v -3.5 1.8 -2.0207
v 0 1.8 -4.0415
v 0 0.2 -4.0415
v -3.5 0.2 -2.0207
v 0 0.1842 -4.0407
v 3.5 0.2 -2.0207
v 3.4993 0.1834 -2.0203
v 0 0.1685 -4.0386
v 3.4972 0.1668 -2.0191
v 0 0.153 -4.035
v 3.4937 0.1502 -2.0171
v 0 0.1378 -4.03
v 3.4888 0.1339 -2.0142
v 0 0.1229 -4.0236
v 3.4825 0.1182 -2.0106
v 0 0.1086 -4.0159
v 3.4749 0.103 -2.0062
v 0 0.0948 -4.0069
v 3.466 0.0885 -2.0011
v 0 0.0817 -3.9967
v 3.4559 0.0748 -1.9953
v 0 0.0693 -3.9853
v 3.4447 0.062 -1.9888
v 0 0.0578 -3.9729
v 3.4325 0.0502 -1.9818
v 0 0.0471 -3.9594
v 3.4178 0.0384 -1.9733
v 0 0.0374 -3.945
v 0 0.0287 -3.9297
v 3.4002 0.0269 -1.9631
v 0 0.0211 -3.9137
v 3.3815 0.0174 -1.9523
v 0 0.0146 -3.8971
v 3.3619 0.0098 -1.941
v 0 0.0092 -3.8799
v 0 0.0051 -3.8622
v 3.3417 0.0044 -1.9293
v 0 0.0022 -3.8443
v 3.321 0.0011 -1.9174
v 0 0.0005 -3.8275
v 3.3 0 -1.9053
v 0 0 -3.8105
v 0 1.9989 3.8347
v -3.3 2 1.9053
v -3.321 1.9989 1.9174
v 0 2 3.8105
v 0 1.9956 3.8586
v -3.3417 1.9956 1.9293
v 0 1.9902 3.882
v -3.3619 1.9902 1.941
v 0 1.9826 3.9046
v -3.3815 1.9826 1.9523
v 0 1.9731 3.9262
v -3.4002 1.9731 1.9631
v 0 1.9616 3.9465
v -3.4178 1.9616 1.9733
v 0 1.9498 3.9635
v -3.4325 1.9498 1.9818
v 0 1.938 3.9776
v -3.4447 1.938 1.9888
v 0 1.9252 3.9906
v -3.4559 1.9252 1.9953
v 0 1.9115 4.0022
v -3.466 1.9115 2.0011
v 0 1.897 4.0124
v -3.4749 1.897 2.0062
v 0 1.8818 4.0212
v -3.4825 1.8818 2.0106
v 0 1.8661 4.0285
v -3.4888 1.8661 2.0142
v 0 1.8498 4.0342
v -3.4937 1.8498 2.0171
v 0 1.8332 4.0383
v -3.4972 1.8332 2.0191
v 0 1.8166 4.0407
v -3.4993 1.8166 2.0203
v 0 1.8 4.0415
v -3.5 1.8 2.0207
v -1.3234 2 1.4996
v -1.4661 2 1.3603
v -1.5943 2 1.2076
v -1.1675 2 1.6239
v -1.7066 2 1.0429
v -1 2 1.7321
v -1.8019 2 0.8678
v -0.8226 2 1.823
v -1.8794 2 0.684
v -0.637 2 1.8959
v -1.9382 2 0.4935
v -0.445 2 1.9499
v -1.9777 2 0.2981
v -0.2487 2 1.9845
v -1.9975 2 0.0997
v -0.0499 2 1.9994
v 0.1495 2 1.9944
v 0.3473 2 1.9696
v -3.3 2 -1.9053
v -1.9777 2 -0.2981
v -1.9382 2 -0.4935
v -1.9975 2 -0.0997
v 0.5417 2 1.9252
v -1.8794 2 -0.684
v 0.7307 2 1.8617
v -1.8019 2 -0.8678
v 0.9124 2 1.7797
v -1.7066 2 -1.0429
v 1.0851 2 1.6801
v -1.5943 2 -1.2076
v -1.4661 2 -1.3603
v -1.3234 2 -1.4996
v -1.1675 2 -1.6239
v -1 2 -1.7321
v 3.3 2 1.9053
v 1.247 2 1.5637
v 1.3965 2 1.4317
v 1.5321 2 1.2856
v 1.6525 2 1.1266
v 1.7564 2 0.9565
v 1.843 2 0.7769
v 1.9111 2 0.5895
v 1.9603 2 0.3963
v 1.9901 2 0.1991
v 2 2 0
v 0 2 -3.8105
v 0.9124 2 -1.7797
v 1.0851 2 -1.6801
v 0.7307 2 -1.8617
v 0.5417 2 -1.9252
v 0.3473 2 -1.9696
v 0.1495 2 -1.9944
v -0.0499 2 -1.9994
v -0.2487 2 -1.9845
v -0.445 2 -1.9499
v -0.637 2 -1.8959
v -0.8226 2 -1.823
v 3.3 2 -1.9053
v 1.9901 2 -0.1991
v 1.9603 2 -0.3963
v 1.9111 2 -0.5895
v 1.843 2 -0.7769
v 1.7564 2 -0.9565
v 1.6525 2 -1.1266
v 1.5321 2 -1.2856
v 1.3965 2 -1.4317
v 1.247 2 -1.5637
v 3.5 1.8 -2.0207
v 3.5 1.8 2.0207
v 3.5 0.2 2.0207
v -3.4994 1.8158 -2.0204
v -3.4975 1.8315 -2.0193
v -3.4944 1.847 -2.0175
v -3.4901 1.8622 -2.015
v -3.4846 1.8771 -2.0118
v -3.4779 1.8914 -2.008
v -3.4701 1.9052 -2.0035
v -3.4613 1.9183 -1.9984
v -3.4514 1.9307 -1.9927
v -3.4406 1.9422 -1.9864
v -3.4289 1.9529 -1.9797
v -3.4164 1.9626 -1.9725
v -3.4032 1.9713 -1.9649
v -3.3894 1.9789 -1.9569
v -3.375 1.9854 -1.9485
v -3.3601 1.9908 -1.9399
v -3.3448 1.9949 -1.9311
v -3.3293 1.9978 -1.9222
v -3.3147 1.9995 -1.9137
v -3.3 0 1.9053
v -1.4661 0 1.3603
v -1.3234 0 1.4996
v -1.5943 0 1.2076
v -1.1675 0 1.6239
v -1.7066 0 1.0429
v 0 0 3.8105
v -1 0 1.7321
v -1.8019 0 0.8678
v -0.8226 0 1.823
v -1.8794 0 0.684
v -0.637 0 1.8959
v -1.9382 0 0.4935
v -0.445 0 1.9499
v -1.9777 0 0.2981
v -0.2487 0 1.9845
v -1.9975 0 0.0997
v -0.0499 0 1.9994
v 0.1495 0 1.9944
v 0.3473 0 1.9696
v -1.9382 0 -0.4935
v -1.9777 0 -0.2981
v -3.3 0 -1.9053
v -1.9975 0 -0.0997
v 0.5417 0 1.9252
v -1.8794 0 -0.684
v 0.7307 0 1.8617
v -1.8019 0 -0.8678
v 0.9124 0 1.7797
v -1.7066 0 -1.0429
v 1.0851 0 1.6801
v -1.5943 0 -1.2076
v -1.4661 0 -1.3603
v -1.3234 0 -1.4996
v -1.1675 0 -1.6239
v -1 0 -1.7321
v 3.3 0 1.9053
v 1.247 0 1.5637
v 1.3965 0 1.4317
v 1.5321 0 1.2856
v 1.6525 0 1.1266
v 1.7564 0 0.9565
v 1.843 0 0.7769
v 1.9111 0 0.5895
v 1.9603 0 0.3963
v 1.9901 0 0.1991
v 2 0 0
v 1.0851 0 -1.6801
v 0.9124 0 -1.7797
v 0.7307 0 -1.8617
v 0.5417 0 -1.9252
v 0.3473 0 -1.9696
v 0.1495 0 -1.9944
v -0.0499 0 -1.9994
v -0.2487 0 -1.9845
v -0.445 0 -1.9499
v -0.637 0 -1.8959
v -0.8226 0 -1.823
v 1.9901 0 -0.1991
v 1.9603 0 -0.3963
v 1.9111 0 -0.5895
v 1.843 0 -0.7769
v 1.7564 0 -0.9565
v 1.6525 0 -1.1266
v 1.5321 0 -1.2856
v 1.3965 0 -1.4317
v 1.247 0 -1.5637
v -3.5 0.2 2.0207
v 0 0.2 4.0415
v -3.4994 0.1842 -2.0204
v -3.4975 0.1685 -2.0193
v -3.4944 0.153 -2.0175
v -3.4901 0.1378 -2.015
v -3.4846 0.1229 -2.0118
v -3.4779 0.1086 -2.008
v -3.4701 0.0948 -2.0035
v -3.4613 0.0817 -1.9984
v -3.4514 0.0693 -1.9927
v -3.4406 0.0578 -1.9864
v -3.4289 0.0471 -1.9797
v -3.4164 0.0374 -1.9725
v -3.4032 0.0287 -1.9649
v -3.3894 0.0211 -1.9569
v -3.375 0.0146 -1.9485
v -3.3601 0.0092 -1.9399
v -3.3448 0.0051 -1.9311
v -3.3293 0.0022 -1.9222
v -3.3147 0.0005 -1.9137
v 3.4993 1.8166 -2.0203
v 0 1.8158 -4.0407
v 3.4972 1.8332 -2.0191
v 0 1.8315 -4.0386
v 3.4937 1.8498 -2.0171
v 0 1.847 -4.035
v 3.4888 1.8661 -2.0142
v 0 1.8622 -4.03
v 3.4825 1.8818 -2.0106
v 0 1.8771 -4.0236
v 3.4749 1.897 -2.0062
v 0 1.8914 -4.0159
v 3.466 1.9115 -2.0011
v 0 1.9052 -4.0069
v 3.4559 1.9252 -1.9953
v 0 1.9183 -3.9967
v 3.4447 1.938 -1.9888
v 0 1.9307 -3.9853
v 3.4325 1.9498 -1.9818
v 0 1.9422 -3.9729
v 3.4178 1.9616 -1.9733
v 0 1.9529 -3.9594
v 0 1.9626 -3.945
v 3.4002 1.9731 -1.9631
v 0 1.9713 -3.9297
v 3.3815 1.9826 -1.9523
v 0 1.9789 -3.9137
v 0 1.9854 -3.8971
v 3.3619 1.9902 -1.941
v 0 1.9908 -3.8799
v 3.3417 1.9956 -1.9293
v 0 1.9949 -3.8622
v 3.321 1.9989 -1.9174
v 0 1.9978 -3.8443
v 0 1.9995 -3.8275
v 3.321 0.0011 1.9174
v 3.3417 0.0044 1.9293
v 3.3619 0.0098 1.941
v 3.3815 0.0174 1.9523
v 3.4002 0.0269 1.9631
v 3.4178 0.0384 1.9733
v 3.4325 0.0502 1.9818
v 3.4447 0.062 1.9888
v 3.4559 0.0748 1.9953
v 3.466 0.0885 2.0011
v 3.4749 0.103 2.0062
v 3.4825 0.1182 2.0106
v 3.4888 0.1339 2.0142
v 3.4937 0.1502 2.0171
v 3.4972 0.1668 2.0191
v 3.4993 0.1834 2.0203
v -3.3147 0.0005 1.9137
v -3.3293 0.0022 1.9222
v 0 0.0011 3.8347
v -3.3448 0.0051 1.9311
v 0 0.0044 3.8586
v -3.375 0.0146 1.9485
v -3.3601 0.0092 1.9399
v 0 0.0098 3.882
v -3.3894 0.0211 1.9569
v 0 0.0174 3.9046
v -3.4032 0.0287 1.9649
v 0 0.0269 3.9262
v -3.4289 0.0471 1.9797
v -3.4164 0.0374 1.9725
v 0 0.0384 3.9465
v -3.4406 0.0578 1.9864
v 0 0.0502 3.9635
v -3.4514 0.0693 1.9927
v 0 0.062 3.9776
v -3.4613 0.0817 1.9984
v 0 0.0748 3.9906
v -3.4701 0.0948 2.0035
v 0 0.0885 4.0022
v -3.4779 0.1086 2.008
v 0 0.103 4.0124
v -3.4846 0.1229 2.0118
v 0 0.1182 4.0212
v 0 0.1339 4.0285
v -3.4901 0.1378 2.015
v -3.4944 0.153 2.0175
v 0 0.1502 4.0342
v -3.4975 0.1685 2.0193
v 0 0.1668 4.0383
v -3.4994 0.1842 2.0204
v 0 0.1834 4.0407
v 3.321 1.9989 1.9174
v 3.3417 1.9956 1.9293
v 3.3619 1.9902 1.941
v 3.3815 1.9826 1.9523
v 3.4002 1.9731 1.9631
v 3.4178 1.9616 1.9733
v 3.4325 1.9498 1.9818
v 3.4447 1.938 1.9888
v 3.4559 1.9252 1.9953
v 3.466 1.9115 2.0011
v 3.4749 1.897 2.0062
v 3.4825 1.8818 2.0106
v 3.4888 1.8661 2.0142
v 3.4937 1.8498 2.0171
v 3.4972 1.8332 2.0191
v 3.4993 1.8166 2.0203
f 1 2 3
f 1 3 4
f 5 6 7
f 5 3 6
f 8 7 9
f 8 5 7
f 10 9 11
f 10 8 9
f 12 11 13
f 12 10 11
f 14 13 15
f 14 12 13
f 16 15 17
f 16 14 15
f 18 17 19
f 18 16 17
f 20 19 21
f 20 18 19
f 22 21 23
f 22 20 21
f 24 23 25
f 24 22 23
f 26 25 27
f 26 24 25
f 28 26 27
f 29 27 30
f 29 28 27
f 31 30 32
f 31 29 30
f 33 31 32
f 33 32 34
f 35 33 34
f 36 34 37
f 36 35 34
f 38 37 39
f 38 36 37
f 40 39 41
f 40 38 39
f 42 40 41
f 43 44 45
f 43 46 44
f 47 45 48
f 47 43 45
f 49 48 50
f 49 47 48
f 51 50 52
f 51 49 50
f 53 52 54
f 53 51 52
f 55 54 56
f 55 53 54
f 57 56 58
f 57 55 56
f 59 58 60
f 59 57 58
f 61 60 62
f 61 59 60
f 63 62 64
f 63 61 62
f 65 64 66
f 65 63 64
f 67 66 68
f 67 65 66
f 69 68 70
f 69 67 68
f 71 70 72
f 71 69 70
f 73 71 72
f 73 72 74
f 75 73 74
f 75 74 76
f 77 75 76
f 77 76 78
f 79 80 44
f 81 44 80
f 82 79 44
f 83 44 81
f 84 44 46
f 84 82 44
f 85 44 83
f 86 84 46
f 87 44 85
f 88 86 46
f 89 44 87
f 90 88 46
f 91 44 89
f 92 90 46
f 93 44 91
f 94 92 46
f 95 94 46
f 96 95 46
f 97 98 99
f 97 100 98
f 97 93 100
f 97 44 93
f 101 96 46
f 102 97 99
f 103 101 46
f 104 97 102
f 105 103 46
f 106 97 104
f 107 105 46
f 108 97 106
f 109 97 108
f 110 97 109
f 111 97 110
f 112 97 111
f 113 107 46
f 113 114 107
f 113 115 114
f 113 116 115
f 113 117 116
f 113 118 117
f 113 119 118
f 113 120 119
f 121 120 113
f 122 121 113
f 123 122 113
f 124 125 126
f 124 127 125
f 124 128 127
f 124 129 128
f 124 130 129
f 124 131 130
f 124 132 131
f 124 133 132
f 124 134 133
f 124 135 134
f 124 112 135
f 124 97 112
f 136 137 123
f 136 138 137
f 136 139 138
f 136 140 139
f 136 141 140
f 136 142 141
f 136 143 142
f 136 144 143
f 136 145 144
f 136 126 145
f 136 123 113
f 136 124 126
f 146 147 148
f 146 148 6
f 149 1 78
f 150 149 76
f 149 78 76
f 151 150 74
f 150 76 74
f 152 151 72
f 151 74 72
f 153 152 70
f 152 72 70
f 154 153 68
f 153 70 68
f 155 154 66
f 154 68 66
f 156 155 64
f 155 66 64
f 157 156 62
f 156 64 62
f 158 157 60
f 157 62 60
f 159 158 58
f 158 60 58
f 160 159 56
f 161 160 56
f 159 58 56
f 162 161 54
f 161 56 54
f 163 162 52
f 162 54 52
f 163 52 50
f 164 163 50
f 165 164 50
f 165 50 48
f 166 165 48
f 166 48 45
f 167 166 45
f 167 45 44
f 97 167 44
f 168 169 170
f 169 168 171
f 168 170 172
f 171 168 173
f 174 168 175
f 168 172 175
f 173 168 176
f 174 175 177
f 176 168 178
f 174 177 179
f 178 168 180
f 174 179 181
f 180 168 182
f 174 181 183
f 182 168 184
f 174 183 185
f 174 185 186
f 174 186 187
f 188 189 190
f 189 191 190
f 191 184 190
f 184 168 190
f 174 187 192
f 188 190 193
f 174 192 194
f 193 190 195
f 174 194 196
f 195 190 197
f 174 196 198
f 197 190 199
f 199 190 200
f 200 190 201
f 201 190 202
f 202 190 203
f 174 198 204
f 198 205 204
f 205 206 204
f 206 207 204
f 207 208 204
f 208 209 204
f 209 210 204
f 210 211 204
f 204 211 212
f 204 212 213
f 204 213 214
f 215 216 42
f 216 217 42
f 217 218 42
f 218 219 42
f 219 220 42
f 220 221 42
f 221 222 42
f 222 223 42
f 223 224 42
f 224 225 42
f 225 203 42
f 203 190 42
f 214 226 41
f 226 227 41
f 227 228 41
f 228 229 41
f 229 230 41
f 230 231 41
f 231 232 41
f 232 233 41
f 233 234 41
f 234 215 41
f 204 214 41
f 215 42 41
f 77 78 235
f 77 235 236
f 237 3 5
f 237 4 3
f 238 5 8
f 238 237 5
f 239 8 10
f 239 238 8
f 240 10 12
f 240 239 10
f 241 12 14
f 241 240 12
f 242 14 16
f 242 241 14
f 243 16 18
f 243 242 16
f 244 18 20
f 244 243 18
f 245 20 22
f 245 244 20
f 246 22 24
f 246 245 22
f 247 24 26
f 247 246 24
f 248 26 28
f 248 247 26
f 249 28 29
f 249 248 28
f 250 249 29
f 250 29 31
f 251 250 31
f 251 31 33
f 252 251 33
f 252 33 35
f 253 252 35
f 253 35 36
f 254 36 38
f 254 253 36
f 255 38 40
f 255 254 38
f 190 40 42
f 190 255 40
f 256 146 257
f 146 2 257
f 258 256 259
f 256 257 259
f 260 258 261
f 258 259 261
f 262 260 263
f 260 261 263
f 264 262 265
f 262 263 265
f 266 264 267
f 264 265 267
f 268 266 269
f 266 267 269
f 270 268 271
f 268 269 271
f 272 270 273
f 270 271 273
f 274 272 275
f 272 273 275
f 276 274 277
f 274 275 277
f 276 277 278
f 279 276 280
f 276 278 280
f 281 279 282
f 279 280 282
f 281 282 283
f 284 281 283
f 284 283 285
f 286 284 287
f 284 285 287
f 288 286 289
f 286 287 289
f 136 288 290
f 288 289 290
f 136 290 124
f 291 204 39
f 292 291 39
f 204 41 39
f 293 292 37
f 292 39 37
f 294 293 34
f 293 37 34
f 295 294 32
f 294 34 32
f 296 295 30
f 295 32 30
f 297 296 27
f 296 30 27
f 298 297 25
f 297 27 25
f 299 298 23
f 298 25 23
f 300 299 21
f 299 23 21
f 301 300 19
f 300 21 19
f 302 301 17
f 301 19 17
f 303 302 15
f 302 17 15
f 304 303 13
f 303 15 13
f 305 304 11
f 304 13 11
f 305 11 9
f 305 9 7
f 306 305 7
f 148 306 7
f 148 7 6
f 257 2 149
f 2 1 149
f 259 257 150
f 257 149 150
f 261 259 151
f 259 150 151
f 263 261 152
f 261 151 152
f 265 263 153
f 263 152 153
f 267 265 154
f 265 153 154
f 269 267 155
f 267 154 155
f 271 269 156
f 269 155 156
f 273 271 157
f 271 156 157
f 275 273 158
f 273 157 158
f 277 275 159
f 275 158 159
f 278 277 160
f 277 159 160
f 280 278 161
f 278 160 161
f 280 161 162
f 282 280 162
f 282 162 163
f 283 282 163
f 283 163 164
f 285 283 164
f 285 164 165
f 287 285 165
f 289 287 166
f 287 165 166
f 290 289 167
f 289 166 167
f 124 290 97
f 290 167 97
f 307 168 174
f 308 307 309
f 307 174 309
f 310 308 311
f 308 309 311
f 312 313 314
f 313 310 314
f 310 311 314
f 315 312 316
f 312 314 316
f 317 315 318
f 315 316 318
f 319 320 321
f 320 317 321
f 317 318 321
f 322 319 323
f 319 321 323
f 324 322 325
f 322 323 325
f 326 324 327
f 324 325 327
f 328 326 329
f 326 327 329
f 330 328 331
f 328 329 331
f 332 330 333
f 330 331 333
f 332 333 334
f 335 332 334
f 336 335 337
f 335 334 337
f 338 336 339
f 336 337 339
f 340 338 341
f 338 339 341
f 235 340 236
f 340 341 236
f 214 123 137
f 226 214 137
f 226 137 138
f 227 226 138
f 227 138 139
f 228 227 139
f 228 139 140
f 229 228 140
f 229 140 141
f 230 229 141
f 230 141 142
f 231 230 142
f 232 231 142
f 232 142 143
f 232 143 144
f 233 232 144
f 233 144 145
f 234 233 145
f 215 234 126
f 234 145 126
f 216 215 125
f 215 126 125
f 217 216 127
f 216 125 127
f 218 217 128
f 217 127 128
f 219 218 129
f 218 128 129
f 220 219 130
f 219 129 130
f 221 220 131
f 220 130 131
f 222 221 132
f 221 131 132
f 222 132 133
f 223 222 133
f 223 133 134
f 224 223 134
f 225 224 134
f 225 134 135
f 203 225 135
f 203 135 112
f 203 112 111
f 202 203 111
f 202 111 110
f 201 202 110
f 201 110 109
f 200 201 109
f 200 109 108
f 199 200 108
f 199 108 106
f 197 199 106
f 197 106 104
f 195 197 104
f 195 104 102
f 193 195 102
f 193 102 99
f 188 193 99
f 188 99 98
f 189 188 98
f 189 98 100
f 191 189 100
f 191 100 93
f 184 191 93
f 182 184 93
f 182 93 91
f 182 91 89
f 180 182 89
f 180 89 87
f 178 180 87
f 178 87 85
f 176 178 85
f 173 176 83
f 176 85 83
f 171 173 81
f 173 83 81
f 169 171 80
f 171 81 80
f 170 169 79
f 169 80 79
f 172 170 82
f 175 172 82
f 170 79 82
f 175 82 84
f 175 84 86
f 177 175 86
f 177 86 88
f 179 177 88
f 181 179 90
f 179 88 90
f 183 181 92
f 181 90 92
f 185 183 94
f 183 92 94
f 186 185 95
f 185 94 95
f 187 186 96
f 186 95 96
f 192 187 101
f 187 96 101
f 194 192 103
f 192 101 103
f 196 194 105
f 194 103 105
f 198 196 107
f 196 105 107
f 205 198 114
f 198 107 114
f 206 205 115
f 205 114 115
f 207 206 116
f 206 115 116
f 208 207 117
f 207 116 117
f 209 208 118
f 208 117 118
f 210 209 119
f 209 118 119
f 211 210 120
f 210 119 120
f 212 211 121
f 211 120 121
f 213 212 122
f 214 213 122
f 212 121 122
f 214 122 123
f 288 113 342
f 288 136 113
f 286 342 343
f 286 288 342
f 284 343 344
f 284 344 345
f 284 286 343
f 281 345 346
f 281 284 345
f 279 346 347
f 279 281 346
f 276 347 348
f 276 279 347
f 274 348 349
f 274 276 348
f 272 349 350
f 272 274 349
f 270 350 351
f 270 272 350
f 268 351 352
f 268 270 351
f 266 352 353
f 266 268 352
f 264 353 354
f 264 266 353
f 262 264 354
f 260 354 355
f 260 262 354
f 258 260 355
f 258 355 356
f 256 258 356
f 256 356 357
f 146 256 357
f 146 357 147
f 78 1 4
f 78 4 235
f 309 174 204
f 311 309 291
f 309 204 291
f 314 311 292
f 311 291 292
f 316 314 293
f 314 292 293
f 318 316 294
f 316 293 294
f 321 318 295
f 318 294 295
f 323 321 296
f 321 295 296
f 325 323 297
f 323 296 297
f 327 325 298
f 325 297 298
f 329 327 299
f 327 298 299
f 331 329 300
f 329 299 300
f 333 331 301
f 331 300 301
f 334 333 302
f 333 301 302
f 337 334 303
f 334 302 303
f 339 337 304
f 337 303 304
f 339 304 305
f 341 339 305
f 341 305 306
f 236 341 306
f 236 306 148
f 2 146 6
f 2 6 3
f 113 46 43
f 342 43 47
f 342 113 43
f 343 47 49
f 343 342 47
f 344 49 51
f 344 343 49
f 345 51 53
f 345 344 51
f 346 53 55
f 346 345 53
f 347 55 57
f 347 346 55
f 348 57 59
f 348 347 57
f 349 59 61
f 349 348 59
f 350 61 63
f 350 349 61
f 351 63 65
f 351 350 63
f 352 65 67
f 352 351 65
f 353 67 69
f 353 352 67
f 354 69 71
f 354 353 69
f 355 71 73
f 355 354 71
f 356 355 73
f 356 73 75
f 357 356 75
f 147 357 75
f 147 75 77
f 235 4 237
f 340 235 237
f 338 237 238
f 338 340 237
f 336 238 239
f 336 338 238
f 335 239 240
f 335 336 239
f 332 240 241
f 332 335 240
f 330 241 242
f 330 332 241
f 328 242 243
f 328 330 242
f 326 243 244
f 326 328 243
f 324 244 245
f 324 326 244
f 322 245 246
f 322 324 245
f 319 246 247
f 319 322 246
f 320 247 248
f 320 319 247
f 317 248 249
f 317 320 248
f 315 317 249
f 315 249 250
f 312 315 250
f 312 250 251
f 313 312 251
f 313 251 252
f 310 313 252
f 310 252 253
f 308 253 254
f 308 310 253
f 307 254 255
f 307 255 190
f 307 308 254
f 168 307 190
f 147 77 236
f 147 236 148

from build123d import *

# Parameters (mm, degrees)
BOSS_EXTRUDE1_DEPTH      = 2
F_4_0_4_DIAMETER_HOLE1_D = 4
FILLET1_R                = 0.2


with BuildPart() as part:
    # Sketch1 → Boss-Extrude1 (new body)
    with BuildSketch(Plane(origin=(0, 2, 0), x_dir=(1, 0, 0), z_dir=(0, 1, 0))):
        Polygon((0, 4.041451884), (-3.5, 2.020725942), (-3.5, -2.020725942), (0, -4.041451884), (3.5, -2.020725942), (3.5, 2.020725942), align=None)
    extrude(amount=-BOSS_EXTRUDE1_DEPTH)

    # Ø4.0 (4) Diameter Hole1 (through all)
    with Locations(Plane(origin=(0, 0, 0), x_dir=(-1, 0, 0), z_dir=(0, -1, 0))):
        with Locations((0, 0)):
            Hole(F_4_0_4_DIAMETER_HOLE1_D / 2)

    # Fillet1
    fillet1_edges = [part.edges().sort_by_distance(p)[0] for p in [
        (-3.5, 0, 0),
        (-1.75, 0, 3.031088913),
        (1.75, 0, 3.031088913),
        (3.5, 0, 0),
        (1.75, 0, -3.031088913),
        (3.5, 2, 0),
        (1.75, 2, 3.031088913),
        (-1.75, 2, 3.031088913),
        (-3.5, 2, 0),
        (-1.75, 2, -3.031088913),
        (1.75, 2, -3.031088913),
        (-1.75, 0, -3.031088913),
    ]]
    fillet(fillet1_edges, radius=FILLET1_R)


solid = part.part
